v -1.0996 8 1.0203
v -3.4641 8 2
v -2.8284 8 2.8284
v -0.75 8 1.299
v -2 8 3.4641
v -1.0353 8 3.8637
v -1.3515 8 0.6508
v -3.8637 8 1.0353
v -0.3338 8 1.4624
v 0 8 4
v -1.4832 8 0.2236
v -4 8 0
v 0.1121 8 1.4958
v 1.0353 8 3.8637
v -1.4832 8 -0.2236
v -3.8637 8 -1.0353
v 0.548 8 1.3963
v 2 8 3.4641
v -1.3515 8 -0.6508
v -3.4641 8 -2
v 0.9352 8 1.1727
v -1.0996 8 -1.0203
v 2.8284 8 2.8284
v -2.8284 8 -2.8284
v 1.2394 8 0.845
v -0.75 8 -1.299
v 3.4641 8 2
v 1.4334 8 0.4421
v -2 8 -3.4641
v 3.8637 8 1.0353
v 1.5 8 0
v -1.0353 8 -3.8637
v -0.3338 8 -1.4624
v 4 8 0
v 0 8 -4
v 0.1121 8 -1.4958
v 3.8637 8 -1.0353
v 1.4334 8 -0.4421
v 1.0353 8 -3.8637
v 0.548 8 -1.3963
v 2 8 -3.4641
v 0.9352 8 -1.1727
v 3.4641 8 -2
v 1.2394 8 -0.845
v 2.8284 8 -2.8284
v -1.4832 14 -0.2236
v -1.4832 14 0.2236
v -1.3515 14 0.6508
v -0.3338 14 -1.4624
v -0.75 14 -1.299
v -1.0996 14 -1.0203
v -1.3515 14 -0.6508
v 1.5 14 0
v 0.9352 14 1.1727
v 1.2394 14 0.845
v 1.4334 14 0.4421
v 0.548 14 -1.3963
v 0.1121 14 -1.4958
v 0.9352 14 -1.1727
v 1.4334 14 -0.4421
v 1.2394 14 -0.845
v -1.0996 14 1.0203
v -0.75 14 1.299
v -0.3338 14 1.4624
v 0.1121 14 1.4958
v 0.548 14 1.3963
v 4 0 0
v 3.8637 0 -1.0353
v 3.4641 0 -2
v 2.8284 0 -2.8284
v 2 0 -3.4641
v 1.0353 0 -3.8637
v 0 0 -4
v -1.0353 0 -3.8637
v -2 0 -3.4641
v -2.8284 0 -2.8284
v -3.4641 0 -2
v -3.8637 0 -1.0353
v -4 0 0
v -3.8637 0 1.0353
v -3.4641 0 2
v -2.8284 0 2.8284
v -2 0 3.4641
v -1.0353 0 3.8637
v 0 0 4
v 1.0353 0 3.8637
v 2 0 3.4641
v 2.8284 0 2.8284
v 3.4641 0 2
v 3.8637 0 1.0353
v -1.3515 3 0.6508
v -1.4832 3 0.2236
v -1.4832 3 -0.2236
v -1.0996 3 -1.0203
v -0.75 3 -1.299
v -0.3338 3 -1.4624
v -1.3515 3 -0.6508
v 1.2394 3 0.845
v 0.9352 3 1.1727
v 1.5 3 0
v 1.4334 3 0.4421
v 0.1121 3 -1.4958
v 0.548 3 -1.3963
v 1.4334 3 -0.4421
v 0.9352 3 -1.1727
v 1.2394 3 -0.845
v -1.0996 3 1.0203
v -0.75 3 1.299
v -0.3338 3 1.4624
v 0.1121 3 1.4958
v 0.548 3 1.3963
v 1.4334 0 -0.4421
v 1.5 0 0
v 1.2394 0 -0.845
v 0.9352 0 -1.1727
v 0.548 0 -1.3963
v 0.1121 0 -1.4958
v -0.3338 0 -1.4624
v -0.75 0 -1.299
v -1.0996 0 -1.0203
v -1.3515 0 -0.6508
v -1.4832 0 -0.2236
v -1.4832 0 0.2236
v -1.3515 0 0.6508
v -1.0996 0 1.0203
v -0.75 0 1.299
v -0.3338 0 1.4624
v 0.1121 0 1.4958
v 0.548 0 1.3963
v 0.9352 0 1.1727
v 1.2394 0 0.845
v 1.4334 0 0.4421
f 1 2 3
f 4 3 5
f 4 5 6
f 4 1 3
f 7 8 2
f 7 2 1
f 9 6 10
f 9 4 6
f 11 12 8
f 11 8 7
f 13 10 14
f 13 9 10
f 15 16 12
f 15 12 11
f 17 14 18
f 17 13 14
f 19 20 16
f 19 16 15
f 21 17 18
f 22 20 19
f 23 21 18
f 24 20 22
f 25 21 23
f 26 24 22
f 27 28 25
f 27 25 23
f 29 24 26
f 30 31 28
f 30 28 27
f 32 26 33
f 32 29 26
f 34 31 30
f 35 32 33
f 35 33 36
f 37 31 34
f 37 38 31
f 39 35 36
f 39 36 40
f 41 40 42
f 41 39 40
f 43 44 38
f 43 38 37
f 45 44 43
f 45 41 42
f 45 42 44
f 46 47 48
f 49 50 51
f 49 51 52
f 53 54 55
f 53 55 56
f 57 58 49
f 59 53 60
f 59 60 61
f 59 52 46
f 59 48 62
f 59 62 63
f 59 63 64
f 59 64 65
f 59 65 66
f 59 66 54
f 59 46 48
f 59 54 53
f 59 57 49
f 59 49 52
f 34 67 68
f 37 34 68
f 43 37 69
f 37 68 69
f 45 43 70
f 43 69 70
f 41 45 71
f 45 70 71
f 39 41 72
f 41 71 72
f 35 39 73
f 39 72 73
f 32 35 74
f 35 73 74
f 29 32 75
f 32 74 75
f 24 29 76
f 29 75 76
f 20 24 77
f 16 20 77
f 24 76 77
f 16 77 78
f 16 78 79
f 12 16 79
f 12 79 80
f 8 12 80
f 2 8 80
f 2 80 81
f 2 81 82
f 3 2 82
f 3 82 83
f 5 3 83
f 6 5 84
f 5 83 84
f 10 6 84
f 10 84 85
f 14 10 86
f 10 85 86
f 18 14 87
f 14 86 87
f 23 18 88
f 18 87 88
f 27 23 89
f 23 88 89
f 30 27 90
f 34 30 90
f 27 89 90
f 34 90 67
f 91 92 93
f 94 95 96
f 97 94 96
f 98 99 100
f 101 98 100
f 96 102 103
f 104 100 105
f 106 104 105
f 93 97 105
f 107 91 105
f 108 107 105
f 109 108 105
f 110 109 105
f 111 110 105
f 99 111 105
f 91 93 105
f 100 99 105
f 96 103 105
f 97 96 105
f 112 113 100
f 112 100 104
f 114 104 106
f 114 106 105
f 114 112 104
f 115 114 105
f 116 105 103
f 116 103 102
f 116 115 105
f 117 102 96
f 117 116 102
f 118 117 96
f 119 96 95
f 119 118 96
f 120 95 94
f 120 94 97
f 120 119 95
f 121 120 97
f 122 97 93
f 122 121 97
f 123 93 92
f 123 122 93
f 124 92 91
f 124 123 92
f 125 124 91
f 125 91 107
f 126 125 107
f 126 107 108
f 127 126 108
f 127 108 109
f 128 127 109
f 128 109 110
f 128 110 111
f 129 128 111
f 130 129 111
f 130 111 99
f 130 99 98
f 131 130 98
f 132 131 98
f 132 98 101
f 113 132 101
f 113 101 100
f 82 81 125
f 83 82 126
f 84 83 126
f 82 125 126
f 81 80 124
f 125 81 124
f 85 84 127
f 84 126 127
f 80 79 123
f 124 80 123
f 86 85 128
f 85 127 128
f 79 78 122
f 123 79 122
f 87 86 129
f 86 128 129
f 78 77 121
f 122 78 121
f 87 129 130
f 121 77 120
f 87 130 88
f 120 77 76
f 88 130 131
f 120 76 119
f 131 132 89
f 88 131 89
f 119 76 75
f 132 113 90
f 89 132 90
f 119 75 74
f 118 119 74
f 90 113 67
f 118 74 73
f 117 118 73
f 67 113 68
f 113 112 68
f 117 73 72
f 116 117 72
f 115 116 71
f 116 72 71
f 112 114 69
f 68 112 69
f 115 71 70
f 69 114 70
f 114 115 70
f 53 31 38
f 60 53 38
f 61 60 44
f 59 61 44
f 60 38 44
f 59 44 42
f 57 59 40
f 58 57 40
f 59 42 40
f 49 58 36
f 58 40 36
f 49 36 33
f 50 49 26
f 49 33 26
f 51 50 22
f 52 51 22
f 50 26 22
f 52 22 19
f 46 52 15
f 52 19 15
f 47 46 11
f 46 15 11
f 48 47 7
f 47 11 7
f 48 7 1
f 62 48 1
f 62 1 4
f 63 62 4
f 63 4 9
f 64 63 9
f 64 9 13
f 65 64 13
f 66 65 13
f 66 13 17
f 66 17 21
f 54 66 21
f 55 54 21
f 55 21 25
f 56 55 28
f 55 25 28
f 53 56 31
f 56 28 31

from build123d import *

# Parameters (mm, degrees)
SKETCH1_R           = 4
SKETCH1_R_2         = 1.5
BOSS_EXTRUDE1_DEPTH = 8
SKETCH2_R           = 1.5
BOSS_EXTRUDE2_DEPTH = 5
SKETCH3_R           = 1.5
BOSS_EXTRUDE3_DEPTH = 6


with BuildPart() as part:
    # Sketch1 → Boss-Extrude1 (new body)
    with BuildSketch(Plane(origin=(0, 0, 0), x_dir=(1, 0, 0), z_dir=(0, 1, 0))):
        Circle(SKETCH1_R)
        Circle(SKETCH1_R_2, mode=Mode.SUBTRACT)
    extrude(amount=BOSS_EXTRUDE1_DEPTH)

    # Sketch2 → Boss-Extrude2 (add)
    with BuildSketch(Plane(origin=(0, 8, 0), x_dir=(1, 0, 0), z_dir=(0, 1, 0))):
        Circle(SKETCH2_R)
    extrude(amount=-BOSS_EXTRUDE2_DEPTH)

    # Sketch3 → Boss-Extrude3 (add)
    with BuildSketch(Plane(origin=(0, 8, 0), x_dir=(1, 0, 0), z_dir=(0, 1, 0))):
        Circle(SKETCH3_R)
    extrude(amount=BOSS_EXTRUDE3_DEPTH)


solid = part.part
